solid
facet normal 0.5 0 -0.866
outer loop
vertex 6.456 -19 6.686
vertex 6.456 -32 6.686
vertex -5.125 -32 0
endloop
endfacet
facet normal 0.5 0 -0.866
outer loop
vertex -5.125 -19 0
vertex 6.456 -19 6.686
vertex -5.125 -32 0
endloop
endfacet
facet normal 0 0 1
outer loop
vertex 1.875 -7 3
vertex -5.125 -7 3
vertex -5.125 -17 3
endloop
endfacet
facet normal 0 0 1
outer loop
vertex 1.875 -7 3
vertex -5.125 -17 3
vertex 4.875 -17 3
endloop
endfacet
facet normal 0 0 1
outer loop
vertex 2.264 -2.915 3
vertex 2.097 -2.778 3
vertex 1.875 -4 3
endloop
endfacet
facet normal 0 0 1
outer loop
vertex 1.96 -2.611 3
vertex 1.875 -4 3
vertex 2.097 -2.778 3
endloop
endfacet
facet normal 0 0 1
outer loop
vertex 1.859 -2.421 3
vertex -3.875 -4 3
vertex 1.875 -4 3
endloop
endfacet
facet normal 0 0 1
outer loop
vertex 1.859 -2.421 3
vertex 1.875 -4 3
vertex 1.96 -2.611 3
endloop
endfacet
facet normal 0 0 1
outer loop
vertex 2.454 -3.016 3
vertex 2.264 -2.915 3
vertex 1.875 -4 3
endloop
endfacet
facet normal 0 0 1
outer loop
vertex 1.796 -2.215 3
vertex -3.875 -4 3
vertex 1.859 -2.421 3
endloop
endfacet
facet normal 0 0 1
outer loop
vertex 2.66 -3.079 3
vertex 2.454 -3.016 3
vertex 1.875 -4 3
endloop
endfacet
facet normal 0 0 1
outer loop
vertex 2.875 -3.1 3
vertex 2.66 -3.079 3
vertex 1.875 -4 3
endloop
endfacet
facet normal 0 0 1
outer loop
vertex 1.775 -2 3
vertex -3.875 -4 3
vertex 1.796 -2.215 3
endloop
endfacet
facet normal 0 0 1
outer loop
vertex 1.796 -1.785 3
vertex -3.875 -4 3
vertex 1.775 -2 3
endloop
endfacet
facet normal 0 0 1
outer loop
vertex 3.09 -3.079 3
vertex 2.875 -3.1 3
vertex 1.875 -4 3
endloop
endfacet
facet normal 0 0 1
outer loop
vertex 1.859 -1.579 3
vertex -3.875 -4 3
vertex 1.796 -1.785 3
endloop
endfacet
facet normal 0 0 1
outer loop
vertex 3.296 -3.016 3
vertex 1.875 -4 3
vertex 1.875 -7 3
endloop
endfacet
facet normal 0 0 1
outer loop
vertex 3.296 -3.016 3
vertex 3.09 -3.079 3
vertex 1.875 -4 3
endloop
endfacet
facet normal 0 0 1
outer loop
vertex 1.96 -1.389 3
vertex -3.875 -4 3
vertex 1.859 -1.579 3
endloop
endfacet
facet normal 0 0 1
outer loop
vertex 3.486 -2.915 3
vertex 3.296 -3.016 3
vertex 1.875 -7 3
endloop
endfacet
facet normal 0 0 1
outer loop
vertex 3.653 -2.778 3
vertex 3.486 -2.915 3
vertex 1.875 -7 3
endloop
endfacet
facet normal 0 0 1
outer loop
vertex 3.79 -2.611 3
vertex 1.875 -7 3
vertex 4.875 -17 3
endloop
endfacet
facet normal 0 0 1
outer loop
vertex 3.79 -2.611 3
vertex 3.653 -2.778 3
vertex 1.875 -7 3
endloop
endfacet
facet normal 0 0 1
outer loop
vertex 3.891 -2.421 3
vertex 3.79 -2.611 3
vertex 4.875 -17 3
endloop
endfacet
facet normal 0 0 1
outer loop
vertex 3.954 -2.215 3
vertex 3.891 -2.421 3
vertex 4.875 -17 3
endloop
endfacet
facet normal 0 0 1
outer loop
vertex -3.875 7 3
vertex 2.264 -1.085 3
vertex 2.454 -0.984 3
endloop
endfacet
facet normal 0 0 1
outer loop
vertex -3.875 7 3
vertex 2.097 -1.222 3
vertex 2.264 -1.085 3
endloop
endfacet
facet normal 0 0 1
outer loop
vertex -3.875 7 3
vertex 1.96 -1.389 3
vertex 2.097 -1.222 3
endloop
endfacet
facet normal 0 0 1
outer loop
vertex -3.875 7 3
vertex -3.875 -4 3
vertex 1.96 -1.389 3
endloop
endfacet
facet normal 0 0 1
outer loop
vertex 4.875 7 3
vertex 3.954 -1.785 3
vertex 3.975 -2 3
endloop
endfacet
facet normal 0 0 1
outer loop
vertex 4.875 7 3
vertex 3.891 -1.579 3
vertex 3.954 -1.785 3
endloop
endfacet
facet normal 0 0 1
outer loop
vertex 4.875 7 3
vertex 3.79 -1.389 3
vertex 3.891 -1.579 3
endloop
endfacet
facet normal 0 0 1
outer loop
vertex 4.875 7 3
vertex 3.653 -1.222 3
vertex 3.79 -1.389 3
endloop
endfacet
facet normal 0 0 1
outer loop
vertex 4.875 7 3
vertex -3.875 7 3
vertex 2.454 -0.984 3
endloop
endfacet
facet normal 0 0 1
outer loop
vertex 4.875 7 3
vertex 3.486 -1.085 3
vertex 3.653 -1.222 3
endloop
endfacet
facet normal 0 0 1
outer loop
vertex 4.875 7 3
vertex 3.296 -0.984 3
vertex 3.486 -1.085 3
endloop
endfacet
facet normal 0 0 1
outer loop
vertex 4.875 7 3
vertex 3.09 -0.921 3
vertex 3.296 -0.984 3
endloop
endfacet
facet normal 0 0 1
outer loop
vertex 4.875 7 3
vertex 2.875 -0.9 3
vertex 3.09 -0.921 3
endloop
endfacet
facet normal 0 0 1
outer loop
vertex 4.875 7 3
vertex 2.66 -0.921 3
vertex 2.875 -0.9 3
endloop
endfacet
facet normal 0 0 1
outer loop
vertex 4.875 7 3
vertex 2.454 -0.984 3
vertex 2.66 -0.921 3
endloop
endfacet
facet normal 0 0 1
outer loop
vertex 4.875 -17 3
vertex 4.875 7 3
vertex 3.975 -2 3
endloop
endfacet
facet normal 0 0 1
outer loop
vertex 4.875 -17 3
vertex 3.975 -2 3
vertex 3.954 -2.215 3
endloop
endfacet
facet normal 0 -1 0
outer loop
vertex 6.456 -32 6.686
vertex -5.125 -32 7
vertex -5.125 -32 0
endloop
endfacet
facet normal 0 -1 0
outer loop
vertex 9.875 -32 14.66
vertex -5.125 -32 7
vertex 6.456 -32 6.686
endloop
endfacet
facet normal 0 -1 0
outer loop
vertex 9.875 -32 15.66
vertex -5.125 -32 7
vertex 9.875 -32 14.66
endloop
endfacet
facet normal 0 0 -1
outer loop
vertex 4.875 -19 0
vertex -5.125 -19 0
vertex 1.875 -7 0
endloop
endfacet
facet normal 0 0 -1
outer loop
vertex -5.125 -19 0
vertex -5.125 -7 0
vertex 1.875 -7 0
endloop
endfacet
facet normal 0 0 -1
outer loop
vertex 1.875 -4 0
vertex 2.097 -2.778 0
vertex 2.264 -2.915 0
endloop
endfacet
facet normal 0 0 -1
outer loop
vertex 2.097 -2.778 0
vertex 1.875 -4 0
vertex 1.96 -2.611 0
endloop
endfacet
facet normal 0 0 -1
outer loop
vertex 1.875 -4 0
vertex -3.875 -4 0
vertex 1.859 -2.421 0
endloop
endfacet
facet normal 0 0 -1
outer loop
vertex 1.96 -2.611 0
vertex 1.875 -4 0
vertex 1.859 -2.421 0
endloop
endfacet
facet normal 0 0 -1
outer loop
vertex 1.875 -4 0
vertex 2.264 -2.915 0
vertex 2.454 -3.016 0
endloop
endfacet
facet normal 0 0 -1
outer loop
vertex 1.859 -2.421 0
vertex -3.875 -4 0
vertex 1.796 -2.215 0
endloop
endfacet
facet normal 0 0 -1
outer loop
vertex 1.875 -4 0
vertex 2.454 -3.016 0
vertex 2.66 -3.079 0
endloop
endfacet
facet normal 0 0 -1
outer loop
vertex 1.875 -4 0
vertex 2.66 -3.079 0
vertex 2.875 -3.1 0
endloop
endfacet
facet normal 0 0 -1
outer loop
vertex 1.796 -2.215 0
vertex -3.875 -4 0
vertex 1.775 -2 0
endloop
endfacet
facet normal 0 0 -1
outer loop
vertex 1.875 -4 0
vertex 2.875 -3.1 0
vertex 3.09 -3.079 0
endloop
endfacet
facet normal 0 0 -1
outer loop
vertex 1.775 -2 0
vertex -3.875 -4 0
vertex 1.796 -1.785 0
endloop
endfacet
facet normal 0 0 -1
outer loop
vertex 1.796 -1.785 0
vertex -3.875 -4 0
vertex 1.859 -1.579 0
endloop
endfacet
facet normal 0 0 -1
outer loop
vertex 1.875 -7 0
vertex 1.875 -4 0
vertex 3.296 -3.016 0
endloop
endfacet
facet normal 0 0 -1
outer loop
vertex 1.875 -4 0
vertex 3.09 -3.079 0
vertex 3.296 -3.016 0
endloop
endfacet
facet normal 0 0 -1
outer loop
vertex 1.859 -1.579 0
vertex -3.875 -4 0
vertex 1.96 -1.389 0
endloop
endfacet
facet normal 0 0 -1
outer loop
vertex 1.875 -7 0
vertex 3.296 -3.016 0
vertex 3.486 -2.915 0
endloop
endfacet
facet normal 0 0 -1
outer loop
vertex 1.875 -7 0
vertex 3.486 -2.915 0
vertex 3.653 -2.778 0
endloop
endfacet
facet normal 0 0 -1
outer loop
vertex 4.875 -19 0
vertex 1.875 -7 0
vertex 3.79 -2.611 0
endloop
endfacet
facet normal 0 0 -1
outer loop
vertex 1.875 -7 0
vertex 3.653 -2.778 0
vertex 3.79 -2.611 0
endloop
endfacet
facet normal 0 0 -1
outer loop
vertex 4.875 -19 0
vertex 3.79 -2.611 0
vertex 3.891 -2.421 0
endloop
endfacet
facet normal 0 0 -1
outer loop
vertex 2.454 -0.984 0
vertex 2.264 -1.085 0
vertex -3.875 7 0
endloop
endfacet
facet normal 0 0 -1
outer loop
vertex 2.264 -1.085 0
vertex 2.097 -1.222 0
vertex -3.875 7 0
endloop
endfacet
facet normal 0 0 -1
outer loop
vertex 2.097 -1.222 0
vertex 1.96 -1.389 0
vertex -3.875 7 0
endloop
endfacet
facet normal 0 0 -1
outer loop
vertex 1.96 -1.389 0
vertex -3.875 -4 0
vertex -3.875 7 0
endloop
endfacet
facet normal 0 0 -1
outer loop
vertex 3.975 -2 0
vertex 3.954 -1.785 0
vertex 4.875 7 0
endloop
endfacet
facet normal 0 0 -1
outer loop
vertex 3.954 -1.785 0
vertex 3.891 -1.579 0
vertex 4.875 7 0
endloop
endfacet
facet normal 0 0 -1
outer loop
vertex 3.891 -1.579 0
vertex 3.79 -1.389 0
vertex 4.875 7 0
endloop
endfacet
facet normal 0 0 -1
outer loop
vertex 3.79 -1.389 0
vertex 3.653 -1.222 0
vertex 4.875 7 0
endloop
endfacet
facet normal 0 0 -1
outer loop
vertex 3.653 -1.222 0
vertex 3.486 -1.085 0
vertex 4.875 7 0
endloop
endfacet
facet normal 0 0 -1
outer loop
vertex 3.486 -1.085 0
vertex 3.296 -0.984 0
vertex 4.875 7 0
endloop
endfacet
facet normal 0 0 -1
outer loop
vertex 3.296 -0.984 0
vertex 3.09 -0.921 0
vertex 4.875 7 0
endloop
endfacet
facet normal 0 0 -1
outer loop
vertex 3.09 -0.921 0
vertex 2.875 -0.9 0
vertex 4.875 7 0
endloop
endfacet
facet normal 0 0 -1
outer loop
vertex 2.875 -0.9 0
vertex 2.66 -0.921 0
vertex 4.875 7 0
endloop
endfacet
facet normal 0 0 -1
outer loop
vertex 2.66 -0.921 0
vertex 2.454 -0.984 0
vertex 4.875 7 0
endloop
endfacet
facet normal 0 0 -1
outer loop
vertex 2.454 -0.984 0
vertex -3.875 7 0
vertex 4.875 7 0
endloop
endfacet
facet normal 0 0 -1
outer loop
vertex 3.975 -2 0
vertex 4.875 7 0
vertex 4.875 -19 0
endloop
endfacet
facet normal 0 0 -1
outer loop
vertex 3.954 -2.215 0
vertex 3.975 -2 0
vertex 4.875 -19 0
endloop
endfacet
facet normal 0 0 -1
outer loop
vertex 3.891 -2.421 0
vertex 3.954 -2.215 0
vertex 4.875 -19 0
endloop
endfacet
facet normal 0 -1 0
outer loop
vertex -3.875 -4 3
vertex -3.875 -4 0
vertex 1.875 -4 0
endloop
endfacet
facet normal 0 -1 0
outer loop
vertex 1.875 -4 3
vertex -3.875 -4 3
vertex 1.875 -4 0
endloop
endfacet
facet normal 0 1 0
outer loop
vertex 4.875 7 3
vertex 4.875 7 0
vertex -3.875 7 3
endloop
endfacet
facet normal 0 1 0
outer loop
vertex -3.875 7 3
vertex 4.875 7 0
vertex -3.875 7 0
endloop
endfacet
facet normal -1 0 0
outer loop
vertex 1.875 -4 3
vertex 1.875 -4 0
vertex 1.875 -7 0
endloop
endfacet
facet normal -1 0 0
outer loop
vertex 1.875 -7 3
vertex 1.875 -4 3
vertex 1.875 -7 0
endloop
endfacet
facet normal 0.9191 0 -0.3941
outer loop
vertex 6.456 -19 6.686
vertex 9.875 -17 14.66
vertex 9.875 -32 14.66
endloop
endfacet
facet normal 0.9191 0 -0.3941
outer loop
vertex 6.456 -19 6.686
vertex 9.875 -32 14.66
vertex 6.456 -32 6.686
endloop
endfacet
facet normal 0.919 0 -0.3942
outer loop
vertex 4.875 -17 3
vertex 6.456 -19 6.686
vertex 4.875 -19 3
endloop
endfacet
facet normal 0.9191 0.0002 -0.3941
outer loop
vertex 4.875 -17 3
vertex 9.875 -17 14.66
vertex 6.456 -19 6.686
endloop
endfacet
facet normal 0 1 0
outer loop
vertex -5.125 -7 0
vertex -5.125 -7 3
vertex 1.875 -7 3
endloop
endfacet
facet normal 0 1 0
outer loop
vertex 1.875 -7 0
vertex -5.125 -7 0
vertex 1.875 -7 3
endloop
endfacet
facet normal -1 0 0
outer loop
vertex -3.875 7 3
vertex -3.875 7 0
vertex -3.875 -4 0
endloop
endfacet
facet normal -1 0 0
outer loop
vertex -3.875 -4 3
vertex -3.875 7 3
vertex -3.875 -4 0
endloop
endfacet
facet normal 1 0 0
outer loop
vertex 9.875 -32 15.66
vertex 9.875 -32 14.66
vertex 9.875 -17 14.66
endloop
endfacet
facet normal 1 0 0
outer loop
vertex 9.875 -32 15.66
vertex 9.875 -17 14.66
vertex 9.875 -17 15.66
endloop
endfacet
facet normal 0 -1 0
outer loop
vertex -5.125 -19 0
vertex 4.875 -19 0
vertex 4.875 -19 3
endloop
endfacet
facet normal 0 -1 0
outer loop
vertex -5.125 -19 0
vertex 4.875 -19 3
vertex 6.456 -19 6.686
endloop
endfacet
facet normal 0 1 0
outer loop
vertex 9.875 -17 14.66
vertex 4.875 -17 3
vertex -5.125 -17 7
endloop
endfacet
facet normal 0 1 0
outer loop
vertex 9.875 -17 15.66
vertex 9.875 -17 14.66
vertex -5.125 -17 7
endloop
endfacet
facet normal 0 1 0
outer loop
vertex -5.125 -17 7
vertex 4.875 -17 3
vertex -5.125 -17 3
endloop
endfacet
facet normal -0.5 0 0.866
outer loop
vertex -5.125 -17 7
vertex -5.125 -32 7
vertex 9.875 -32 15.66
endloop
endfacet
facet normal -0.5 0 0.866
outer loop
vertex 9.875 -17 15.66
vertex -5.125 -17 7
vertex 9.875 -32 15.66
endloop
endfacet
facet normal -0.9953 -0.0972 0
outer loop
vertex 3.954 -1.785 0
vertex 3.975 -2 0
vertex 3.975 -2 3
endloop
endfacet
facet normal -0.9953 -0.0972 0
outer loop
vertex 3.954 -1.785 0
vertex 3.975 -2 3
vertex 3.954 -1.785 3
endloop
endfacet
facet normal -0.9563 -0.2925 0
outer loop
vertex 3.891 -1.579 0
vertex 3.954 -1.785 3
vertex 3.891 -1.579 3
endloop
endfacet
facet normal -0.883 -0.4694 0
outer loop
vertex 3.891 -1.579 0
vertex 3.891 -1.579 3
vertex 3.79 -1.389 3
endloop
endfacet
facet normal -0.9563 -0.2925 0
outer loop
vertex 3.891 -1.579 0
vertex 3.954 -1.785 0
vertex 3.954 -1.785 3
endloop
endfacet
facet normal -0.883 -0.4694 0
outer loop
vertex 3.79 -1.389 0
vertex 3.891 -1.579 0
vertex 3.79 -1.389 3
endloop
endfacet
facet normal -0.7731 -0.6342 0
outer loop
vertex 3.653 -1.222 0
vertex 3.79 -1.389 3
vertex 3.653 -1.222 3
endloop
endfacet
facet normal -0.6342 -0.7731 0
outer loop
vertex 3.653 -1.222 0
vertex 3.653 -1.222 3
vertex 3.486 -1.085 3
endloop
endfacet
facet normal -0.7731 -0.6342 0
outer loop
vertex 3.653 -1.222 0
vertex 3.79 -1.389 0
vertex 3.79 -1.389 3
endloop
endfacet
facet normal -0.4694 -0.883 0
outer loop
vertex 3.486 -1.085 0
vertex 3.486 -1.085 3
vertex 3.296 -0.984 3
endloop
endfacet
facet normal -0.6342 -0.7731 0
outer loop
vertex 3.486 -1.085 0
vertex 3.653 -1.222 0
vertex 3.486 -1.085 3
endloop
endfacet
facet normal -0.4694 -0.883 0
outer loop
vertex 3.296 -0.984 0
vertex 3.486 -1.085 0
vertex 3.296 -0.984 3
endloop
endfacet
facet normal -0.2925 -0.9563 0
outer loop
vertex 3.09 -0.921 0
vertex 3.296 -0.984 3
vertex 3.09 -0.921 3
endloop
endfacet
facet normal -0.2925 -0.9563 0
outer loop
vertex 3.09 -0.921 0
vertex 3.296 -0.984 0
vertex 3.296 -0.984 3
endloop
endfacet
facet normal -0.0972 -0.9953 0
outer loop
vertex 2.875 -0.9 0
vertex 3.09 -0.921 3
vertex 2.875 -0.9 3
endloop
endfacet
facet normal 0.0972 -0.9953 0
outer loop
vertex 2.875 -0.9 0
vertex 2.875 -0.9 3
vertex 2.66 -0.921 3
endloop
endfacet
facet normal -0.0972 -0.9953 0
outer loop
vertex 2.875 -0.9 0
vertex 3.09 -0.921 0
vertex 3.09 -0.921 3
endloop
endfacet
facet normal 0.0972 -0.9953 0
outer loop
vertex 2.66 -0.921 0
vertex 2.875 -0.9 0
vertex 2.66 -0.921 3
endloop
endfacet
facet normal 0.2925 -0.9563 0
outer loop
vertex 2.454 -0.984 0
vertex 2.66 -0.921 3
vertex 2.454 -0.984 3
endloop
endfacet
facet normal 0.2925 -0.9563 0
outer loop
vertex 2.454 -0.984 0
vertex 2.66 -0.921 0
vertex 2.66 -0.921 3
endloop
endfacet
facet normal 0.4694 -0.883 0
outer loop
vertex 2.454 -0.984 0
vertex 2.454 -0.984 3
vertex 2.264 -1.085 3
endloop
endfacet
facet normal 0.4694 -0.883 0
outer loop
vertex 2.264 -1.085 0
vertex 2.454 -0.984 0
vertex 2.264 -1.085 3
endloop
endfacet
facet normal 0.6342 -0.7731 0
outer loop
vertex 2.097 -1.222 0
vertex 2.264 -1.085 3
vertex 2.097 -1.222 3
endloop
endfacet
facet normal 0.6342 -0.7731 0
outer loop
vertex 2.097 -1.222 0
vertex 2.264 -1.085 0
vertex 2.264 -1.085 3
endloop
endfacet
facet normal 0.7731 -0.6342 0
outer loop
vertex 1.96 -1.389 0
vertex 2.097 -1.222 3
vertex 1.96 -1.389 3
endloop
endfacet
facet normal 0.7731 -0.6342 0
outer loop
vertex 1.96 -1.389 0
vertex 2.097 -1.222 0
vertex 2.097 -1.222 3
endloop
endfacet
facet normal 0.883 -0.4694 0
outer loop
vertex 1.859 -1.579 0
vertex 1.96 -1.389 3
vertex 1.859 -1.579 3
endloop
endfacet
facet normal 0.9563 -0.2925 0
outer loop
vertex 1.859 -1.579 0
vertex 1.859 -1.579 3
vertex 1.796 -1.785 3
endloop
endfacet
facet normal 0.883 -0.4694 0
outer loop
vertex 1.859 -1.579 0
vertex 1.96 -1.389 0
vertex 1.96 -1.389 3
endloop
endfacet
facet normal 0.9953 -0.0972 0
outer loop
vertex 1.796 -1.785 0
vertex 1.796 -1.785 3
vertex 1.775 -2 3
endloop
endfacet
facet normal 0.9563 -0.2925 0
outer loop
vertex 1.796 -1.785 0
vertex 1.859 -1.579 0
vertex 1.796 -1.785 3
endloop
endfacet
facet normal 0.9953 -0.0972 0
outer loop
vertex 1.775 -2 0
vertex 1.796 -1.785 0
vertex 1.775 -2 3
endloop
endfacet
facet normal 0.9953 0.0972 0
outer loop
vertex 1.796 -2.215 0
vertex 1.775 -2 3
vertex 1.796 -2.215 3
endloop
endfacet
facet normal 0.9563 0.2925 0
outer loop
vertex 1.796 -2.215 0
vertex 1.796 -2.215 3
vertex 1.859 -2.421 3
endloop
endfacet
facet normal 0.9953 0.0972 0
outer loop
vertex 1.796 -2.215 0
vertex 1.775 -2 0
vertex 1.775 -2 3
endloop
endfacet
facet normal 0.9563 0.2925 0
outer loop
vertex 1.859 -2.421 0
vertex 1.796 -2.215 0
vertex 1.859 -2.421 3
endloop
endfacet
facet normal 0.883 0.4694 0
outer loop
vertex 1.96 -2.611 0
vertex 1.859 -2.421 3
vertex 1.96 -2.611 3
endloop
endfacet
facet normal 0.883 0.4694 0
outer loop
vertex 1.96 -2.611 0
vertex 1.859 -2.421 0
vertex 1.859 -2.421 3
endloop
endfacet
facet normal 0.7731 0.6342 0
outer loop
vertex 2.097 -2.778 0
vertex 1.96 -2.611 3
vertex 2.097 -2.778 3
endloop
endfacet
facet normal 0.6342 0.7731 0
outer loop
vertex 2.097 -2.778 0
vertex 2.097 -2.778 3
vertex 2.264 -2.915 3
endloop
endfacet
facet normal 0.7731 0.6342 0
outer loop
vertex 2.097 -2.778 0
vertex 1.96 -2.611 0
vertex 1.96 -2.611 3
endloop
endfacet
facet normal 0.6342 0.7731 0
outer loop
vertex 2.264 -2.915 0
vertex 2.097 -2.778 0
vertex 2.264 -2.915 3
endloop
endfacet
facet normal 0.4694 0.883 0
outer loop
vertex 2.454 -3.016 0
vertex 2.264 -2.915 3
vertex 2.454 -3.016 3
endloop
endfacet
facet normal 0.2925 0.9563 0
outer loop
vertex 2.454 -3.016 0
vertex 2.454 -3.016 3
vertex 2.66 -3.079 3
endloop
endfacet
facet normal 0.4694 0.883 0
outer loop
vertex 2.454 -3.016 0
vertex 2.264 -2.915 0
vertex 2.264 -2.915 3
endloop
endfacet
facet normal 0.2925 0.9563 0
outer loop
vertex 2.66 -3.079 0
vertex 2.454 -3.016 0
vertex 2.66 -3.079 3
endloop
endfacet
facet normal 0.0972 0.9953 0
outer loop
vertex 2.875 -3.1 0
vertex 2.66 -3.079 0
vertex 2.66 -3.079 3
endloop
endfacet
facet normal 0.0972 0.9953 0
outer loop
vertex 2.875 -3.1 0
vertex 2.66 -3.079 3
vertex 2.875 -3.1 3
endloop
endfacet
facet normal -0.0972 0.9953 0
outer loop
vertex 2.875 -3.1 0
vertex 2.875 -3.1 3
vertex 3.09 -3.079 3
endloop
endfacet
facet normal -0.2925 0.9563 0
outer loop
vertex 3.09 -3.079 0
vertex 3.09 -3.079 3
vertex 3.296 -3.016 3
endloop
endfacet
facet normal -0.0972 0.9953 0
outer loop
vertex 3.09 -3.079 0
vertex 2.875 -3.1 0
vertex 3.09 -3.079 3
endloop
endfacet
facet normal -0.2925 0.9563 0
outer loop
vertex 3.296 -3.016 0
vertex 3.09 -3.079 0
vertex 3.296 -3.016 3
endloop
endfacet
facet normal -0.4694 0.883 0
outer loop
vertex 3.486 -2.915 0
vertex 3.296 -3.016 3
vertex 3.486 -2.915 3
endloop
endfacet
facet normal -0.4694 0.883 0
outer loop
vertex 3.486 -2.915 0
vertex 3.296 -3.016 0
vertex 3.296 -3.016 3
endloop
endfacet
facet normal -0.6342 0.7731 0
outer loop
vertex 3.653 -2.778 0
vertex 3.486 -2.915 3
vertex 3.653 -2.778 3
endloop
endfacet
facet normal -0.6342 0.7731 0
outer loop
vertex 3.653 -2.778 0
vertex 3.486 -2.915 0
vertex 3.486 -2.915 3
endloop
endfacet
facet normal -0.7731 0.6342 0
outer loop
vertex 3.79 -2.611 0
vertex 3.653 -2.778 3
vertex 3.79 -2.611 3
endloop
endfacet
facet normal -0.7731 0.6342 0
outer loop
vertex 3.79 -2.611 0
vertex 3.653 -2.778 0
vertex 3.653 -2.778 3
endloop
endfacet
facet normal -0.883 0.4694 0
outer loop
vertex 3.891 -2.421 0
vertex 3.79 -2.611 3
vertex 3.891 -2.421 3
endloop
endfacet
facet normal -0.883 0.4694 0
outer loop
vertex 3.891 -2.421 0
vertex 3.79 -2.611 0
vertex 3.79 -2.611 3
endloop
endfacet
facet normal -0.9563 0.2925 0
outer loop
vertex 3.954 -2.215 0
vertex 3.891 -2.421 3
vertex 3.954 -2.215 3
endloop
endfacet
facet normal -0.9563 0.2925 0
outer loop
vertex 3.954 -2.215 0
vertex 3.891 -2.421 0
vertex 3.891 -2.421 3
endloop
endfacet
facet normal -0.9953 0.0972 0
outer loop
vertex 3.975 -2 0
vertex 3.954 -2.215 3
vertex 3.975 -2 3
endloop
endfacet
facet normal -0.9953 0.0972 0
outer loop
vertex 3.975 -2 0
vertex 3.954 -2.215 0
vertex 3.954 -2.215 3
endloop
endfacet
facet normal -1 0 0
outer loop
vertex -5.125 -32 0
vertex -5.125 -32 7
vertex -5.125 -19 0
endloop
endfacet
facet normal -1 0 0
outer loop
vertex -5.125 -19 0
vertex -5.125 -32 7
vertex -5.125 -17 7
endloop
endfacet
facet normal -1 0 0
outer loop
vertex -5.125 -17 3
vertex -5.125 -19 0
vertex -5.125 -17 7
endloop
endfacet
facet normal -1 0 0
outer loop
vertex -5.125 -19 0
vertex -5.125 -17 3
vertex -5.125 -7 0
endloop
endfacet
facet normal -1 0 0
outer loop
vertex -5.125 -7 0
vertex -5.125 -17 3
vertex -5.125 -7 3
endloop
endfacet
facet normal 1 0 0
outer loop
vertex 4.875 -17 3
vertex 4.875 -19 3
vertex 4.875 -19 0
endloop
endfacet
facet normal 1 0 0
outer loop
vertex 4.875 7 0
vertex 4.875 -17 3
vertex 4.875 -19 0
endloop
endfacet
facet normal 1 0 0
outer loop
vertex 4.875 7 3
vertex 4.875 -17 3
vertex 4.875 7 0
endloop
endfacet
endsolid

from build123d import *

# Parameters (mm, degrees)
SKETCH1_R           = 1.1
BOSS_EXTRUDE1_DEPTH = 3
SKETCH2_W           = 10
SKETCH2_H           = 25
BOSS_EXTRUDE2_DEPTH = 3
SKETCH3_W           = 5
SKETCH3_H           = 3
SKETCH3_W_2         = 10
BOSS_EXTRUDE3_DEPTH = 15
CUT_EXTRUDE1_DEPTH  = 15
CUT_EXTRUDE3_DEPTH  = 13


with BuildPart() as part:
    # Sketch1 → Boss-Extrude1 (new body)
    with BuildSketch(Plane.XY):
        Polygon((4.875, 7), (-3.875, 7), (-3.875, -4), (1.875, -4), (1.875, -7), (4.875, -7), align=None)
        with Locations((2.875, -2)):
            Circle(SKETCH1_R, mode=Mode.SUBTRACT)
    extrude(amount=BOSS_EXTRUDE1_DEPTH)

    # Sketch2 → Boss-Extrude2 (add)
    with BuildSketch(Plane.XY.offset(3)):
        with Locations((-0.125, -19.5)):
            Rectangle(SKETCH2_W, SKETCH2_H)
    extrude(amount=-BOSS_EXTRUDE2_DEPTH)

    # Sketch3 → Boss-Extrude3 (add)
    with BuildSketch(Plane(origin=(0, -32, 0), x_dir=(-1, 0, 0), z_dir=(0, -1, 0))):
        Polygon((-9.875, -11.660254038), (5.125, -3), (-4.875, -3), (-9.875, -3), align=None)
        with Locations((-7.375, -1.5)):
            Rectangle(SKETCH3_W, SKETCH3_H)
        with Locations((0.125, -1.5)):
            Rectangle(SKETCH3_W_2, SKETCH3_H)
        Polygon((5.125, -7), (-9.875, -15.660254038), (-9.875, -11.660254038), (5.125, -3), align=None)
    extrude(amount=-BOSS_EXTRUDE3_DEPTH)

    # Sketch5 → Cut-Extrude1 (cut)
    with BuildSketch(Plane(origin=(0, -17, 0), x_dir=(1, 0, 0), z_dir=(0, 1, 0))):
        Polygon((9.875, -14.660254038), (4.875, -3), (4.875, 0), (9.875, 0), align=None)
    extrude(amount=-CUT_EXTRUDE1_DEPTH, mode=Mode.SUBTRACT)

    # Sketch6 → Cut-Extrude3 (cut)
    with BuildSketch(Plane(origin=(0, -32, 0), x_dir=(-1, 0, 0), z_dir=(0, -1, 0))):
        Polygon((-6.45561312, -6.686070102), (5.125, 0), (-4.875, 0), (-4.875, -3), align=None)
    extrude(amount=-CUT_EXTRUDE3_DEPTH, mode=Mode.SUBTRACT)


solid = part.part
